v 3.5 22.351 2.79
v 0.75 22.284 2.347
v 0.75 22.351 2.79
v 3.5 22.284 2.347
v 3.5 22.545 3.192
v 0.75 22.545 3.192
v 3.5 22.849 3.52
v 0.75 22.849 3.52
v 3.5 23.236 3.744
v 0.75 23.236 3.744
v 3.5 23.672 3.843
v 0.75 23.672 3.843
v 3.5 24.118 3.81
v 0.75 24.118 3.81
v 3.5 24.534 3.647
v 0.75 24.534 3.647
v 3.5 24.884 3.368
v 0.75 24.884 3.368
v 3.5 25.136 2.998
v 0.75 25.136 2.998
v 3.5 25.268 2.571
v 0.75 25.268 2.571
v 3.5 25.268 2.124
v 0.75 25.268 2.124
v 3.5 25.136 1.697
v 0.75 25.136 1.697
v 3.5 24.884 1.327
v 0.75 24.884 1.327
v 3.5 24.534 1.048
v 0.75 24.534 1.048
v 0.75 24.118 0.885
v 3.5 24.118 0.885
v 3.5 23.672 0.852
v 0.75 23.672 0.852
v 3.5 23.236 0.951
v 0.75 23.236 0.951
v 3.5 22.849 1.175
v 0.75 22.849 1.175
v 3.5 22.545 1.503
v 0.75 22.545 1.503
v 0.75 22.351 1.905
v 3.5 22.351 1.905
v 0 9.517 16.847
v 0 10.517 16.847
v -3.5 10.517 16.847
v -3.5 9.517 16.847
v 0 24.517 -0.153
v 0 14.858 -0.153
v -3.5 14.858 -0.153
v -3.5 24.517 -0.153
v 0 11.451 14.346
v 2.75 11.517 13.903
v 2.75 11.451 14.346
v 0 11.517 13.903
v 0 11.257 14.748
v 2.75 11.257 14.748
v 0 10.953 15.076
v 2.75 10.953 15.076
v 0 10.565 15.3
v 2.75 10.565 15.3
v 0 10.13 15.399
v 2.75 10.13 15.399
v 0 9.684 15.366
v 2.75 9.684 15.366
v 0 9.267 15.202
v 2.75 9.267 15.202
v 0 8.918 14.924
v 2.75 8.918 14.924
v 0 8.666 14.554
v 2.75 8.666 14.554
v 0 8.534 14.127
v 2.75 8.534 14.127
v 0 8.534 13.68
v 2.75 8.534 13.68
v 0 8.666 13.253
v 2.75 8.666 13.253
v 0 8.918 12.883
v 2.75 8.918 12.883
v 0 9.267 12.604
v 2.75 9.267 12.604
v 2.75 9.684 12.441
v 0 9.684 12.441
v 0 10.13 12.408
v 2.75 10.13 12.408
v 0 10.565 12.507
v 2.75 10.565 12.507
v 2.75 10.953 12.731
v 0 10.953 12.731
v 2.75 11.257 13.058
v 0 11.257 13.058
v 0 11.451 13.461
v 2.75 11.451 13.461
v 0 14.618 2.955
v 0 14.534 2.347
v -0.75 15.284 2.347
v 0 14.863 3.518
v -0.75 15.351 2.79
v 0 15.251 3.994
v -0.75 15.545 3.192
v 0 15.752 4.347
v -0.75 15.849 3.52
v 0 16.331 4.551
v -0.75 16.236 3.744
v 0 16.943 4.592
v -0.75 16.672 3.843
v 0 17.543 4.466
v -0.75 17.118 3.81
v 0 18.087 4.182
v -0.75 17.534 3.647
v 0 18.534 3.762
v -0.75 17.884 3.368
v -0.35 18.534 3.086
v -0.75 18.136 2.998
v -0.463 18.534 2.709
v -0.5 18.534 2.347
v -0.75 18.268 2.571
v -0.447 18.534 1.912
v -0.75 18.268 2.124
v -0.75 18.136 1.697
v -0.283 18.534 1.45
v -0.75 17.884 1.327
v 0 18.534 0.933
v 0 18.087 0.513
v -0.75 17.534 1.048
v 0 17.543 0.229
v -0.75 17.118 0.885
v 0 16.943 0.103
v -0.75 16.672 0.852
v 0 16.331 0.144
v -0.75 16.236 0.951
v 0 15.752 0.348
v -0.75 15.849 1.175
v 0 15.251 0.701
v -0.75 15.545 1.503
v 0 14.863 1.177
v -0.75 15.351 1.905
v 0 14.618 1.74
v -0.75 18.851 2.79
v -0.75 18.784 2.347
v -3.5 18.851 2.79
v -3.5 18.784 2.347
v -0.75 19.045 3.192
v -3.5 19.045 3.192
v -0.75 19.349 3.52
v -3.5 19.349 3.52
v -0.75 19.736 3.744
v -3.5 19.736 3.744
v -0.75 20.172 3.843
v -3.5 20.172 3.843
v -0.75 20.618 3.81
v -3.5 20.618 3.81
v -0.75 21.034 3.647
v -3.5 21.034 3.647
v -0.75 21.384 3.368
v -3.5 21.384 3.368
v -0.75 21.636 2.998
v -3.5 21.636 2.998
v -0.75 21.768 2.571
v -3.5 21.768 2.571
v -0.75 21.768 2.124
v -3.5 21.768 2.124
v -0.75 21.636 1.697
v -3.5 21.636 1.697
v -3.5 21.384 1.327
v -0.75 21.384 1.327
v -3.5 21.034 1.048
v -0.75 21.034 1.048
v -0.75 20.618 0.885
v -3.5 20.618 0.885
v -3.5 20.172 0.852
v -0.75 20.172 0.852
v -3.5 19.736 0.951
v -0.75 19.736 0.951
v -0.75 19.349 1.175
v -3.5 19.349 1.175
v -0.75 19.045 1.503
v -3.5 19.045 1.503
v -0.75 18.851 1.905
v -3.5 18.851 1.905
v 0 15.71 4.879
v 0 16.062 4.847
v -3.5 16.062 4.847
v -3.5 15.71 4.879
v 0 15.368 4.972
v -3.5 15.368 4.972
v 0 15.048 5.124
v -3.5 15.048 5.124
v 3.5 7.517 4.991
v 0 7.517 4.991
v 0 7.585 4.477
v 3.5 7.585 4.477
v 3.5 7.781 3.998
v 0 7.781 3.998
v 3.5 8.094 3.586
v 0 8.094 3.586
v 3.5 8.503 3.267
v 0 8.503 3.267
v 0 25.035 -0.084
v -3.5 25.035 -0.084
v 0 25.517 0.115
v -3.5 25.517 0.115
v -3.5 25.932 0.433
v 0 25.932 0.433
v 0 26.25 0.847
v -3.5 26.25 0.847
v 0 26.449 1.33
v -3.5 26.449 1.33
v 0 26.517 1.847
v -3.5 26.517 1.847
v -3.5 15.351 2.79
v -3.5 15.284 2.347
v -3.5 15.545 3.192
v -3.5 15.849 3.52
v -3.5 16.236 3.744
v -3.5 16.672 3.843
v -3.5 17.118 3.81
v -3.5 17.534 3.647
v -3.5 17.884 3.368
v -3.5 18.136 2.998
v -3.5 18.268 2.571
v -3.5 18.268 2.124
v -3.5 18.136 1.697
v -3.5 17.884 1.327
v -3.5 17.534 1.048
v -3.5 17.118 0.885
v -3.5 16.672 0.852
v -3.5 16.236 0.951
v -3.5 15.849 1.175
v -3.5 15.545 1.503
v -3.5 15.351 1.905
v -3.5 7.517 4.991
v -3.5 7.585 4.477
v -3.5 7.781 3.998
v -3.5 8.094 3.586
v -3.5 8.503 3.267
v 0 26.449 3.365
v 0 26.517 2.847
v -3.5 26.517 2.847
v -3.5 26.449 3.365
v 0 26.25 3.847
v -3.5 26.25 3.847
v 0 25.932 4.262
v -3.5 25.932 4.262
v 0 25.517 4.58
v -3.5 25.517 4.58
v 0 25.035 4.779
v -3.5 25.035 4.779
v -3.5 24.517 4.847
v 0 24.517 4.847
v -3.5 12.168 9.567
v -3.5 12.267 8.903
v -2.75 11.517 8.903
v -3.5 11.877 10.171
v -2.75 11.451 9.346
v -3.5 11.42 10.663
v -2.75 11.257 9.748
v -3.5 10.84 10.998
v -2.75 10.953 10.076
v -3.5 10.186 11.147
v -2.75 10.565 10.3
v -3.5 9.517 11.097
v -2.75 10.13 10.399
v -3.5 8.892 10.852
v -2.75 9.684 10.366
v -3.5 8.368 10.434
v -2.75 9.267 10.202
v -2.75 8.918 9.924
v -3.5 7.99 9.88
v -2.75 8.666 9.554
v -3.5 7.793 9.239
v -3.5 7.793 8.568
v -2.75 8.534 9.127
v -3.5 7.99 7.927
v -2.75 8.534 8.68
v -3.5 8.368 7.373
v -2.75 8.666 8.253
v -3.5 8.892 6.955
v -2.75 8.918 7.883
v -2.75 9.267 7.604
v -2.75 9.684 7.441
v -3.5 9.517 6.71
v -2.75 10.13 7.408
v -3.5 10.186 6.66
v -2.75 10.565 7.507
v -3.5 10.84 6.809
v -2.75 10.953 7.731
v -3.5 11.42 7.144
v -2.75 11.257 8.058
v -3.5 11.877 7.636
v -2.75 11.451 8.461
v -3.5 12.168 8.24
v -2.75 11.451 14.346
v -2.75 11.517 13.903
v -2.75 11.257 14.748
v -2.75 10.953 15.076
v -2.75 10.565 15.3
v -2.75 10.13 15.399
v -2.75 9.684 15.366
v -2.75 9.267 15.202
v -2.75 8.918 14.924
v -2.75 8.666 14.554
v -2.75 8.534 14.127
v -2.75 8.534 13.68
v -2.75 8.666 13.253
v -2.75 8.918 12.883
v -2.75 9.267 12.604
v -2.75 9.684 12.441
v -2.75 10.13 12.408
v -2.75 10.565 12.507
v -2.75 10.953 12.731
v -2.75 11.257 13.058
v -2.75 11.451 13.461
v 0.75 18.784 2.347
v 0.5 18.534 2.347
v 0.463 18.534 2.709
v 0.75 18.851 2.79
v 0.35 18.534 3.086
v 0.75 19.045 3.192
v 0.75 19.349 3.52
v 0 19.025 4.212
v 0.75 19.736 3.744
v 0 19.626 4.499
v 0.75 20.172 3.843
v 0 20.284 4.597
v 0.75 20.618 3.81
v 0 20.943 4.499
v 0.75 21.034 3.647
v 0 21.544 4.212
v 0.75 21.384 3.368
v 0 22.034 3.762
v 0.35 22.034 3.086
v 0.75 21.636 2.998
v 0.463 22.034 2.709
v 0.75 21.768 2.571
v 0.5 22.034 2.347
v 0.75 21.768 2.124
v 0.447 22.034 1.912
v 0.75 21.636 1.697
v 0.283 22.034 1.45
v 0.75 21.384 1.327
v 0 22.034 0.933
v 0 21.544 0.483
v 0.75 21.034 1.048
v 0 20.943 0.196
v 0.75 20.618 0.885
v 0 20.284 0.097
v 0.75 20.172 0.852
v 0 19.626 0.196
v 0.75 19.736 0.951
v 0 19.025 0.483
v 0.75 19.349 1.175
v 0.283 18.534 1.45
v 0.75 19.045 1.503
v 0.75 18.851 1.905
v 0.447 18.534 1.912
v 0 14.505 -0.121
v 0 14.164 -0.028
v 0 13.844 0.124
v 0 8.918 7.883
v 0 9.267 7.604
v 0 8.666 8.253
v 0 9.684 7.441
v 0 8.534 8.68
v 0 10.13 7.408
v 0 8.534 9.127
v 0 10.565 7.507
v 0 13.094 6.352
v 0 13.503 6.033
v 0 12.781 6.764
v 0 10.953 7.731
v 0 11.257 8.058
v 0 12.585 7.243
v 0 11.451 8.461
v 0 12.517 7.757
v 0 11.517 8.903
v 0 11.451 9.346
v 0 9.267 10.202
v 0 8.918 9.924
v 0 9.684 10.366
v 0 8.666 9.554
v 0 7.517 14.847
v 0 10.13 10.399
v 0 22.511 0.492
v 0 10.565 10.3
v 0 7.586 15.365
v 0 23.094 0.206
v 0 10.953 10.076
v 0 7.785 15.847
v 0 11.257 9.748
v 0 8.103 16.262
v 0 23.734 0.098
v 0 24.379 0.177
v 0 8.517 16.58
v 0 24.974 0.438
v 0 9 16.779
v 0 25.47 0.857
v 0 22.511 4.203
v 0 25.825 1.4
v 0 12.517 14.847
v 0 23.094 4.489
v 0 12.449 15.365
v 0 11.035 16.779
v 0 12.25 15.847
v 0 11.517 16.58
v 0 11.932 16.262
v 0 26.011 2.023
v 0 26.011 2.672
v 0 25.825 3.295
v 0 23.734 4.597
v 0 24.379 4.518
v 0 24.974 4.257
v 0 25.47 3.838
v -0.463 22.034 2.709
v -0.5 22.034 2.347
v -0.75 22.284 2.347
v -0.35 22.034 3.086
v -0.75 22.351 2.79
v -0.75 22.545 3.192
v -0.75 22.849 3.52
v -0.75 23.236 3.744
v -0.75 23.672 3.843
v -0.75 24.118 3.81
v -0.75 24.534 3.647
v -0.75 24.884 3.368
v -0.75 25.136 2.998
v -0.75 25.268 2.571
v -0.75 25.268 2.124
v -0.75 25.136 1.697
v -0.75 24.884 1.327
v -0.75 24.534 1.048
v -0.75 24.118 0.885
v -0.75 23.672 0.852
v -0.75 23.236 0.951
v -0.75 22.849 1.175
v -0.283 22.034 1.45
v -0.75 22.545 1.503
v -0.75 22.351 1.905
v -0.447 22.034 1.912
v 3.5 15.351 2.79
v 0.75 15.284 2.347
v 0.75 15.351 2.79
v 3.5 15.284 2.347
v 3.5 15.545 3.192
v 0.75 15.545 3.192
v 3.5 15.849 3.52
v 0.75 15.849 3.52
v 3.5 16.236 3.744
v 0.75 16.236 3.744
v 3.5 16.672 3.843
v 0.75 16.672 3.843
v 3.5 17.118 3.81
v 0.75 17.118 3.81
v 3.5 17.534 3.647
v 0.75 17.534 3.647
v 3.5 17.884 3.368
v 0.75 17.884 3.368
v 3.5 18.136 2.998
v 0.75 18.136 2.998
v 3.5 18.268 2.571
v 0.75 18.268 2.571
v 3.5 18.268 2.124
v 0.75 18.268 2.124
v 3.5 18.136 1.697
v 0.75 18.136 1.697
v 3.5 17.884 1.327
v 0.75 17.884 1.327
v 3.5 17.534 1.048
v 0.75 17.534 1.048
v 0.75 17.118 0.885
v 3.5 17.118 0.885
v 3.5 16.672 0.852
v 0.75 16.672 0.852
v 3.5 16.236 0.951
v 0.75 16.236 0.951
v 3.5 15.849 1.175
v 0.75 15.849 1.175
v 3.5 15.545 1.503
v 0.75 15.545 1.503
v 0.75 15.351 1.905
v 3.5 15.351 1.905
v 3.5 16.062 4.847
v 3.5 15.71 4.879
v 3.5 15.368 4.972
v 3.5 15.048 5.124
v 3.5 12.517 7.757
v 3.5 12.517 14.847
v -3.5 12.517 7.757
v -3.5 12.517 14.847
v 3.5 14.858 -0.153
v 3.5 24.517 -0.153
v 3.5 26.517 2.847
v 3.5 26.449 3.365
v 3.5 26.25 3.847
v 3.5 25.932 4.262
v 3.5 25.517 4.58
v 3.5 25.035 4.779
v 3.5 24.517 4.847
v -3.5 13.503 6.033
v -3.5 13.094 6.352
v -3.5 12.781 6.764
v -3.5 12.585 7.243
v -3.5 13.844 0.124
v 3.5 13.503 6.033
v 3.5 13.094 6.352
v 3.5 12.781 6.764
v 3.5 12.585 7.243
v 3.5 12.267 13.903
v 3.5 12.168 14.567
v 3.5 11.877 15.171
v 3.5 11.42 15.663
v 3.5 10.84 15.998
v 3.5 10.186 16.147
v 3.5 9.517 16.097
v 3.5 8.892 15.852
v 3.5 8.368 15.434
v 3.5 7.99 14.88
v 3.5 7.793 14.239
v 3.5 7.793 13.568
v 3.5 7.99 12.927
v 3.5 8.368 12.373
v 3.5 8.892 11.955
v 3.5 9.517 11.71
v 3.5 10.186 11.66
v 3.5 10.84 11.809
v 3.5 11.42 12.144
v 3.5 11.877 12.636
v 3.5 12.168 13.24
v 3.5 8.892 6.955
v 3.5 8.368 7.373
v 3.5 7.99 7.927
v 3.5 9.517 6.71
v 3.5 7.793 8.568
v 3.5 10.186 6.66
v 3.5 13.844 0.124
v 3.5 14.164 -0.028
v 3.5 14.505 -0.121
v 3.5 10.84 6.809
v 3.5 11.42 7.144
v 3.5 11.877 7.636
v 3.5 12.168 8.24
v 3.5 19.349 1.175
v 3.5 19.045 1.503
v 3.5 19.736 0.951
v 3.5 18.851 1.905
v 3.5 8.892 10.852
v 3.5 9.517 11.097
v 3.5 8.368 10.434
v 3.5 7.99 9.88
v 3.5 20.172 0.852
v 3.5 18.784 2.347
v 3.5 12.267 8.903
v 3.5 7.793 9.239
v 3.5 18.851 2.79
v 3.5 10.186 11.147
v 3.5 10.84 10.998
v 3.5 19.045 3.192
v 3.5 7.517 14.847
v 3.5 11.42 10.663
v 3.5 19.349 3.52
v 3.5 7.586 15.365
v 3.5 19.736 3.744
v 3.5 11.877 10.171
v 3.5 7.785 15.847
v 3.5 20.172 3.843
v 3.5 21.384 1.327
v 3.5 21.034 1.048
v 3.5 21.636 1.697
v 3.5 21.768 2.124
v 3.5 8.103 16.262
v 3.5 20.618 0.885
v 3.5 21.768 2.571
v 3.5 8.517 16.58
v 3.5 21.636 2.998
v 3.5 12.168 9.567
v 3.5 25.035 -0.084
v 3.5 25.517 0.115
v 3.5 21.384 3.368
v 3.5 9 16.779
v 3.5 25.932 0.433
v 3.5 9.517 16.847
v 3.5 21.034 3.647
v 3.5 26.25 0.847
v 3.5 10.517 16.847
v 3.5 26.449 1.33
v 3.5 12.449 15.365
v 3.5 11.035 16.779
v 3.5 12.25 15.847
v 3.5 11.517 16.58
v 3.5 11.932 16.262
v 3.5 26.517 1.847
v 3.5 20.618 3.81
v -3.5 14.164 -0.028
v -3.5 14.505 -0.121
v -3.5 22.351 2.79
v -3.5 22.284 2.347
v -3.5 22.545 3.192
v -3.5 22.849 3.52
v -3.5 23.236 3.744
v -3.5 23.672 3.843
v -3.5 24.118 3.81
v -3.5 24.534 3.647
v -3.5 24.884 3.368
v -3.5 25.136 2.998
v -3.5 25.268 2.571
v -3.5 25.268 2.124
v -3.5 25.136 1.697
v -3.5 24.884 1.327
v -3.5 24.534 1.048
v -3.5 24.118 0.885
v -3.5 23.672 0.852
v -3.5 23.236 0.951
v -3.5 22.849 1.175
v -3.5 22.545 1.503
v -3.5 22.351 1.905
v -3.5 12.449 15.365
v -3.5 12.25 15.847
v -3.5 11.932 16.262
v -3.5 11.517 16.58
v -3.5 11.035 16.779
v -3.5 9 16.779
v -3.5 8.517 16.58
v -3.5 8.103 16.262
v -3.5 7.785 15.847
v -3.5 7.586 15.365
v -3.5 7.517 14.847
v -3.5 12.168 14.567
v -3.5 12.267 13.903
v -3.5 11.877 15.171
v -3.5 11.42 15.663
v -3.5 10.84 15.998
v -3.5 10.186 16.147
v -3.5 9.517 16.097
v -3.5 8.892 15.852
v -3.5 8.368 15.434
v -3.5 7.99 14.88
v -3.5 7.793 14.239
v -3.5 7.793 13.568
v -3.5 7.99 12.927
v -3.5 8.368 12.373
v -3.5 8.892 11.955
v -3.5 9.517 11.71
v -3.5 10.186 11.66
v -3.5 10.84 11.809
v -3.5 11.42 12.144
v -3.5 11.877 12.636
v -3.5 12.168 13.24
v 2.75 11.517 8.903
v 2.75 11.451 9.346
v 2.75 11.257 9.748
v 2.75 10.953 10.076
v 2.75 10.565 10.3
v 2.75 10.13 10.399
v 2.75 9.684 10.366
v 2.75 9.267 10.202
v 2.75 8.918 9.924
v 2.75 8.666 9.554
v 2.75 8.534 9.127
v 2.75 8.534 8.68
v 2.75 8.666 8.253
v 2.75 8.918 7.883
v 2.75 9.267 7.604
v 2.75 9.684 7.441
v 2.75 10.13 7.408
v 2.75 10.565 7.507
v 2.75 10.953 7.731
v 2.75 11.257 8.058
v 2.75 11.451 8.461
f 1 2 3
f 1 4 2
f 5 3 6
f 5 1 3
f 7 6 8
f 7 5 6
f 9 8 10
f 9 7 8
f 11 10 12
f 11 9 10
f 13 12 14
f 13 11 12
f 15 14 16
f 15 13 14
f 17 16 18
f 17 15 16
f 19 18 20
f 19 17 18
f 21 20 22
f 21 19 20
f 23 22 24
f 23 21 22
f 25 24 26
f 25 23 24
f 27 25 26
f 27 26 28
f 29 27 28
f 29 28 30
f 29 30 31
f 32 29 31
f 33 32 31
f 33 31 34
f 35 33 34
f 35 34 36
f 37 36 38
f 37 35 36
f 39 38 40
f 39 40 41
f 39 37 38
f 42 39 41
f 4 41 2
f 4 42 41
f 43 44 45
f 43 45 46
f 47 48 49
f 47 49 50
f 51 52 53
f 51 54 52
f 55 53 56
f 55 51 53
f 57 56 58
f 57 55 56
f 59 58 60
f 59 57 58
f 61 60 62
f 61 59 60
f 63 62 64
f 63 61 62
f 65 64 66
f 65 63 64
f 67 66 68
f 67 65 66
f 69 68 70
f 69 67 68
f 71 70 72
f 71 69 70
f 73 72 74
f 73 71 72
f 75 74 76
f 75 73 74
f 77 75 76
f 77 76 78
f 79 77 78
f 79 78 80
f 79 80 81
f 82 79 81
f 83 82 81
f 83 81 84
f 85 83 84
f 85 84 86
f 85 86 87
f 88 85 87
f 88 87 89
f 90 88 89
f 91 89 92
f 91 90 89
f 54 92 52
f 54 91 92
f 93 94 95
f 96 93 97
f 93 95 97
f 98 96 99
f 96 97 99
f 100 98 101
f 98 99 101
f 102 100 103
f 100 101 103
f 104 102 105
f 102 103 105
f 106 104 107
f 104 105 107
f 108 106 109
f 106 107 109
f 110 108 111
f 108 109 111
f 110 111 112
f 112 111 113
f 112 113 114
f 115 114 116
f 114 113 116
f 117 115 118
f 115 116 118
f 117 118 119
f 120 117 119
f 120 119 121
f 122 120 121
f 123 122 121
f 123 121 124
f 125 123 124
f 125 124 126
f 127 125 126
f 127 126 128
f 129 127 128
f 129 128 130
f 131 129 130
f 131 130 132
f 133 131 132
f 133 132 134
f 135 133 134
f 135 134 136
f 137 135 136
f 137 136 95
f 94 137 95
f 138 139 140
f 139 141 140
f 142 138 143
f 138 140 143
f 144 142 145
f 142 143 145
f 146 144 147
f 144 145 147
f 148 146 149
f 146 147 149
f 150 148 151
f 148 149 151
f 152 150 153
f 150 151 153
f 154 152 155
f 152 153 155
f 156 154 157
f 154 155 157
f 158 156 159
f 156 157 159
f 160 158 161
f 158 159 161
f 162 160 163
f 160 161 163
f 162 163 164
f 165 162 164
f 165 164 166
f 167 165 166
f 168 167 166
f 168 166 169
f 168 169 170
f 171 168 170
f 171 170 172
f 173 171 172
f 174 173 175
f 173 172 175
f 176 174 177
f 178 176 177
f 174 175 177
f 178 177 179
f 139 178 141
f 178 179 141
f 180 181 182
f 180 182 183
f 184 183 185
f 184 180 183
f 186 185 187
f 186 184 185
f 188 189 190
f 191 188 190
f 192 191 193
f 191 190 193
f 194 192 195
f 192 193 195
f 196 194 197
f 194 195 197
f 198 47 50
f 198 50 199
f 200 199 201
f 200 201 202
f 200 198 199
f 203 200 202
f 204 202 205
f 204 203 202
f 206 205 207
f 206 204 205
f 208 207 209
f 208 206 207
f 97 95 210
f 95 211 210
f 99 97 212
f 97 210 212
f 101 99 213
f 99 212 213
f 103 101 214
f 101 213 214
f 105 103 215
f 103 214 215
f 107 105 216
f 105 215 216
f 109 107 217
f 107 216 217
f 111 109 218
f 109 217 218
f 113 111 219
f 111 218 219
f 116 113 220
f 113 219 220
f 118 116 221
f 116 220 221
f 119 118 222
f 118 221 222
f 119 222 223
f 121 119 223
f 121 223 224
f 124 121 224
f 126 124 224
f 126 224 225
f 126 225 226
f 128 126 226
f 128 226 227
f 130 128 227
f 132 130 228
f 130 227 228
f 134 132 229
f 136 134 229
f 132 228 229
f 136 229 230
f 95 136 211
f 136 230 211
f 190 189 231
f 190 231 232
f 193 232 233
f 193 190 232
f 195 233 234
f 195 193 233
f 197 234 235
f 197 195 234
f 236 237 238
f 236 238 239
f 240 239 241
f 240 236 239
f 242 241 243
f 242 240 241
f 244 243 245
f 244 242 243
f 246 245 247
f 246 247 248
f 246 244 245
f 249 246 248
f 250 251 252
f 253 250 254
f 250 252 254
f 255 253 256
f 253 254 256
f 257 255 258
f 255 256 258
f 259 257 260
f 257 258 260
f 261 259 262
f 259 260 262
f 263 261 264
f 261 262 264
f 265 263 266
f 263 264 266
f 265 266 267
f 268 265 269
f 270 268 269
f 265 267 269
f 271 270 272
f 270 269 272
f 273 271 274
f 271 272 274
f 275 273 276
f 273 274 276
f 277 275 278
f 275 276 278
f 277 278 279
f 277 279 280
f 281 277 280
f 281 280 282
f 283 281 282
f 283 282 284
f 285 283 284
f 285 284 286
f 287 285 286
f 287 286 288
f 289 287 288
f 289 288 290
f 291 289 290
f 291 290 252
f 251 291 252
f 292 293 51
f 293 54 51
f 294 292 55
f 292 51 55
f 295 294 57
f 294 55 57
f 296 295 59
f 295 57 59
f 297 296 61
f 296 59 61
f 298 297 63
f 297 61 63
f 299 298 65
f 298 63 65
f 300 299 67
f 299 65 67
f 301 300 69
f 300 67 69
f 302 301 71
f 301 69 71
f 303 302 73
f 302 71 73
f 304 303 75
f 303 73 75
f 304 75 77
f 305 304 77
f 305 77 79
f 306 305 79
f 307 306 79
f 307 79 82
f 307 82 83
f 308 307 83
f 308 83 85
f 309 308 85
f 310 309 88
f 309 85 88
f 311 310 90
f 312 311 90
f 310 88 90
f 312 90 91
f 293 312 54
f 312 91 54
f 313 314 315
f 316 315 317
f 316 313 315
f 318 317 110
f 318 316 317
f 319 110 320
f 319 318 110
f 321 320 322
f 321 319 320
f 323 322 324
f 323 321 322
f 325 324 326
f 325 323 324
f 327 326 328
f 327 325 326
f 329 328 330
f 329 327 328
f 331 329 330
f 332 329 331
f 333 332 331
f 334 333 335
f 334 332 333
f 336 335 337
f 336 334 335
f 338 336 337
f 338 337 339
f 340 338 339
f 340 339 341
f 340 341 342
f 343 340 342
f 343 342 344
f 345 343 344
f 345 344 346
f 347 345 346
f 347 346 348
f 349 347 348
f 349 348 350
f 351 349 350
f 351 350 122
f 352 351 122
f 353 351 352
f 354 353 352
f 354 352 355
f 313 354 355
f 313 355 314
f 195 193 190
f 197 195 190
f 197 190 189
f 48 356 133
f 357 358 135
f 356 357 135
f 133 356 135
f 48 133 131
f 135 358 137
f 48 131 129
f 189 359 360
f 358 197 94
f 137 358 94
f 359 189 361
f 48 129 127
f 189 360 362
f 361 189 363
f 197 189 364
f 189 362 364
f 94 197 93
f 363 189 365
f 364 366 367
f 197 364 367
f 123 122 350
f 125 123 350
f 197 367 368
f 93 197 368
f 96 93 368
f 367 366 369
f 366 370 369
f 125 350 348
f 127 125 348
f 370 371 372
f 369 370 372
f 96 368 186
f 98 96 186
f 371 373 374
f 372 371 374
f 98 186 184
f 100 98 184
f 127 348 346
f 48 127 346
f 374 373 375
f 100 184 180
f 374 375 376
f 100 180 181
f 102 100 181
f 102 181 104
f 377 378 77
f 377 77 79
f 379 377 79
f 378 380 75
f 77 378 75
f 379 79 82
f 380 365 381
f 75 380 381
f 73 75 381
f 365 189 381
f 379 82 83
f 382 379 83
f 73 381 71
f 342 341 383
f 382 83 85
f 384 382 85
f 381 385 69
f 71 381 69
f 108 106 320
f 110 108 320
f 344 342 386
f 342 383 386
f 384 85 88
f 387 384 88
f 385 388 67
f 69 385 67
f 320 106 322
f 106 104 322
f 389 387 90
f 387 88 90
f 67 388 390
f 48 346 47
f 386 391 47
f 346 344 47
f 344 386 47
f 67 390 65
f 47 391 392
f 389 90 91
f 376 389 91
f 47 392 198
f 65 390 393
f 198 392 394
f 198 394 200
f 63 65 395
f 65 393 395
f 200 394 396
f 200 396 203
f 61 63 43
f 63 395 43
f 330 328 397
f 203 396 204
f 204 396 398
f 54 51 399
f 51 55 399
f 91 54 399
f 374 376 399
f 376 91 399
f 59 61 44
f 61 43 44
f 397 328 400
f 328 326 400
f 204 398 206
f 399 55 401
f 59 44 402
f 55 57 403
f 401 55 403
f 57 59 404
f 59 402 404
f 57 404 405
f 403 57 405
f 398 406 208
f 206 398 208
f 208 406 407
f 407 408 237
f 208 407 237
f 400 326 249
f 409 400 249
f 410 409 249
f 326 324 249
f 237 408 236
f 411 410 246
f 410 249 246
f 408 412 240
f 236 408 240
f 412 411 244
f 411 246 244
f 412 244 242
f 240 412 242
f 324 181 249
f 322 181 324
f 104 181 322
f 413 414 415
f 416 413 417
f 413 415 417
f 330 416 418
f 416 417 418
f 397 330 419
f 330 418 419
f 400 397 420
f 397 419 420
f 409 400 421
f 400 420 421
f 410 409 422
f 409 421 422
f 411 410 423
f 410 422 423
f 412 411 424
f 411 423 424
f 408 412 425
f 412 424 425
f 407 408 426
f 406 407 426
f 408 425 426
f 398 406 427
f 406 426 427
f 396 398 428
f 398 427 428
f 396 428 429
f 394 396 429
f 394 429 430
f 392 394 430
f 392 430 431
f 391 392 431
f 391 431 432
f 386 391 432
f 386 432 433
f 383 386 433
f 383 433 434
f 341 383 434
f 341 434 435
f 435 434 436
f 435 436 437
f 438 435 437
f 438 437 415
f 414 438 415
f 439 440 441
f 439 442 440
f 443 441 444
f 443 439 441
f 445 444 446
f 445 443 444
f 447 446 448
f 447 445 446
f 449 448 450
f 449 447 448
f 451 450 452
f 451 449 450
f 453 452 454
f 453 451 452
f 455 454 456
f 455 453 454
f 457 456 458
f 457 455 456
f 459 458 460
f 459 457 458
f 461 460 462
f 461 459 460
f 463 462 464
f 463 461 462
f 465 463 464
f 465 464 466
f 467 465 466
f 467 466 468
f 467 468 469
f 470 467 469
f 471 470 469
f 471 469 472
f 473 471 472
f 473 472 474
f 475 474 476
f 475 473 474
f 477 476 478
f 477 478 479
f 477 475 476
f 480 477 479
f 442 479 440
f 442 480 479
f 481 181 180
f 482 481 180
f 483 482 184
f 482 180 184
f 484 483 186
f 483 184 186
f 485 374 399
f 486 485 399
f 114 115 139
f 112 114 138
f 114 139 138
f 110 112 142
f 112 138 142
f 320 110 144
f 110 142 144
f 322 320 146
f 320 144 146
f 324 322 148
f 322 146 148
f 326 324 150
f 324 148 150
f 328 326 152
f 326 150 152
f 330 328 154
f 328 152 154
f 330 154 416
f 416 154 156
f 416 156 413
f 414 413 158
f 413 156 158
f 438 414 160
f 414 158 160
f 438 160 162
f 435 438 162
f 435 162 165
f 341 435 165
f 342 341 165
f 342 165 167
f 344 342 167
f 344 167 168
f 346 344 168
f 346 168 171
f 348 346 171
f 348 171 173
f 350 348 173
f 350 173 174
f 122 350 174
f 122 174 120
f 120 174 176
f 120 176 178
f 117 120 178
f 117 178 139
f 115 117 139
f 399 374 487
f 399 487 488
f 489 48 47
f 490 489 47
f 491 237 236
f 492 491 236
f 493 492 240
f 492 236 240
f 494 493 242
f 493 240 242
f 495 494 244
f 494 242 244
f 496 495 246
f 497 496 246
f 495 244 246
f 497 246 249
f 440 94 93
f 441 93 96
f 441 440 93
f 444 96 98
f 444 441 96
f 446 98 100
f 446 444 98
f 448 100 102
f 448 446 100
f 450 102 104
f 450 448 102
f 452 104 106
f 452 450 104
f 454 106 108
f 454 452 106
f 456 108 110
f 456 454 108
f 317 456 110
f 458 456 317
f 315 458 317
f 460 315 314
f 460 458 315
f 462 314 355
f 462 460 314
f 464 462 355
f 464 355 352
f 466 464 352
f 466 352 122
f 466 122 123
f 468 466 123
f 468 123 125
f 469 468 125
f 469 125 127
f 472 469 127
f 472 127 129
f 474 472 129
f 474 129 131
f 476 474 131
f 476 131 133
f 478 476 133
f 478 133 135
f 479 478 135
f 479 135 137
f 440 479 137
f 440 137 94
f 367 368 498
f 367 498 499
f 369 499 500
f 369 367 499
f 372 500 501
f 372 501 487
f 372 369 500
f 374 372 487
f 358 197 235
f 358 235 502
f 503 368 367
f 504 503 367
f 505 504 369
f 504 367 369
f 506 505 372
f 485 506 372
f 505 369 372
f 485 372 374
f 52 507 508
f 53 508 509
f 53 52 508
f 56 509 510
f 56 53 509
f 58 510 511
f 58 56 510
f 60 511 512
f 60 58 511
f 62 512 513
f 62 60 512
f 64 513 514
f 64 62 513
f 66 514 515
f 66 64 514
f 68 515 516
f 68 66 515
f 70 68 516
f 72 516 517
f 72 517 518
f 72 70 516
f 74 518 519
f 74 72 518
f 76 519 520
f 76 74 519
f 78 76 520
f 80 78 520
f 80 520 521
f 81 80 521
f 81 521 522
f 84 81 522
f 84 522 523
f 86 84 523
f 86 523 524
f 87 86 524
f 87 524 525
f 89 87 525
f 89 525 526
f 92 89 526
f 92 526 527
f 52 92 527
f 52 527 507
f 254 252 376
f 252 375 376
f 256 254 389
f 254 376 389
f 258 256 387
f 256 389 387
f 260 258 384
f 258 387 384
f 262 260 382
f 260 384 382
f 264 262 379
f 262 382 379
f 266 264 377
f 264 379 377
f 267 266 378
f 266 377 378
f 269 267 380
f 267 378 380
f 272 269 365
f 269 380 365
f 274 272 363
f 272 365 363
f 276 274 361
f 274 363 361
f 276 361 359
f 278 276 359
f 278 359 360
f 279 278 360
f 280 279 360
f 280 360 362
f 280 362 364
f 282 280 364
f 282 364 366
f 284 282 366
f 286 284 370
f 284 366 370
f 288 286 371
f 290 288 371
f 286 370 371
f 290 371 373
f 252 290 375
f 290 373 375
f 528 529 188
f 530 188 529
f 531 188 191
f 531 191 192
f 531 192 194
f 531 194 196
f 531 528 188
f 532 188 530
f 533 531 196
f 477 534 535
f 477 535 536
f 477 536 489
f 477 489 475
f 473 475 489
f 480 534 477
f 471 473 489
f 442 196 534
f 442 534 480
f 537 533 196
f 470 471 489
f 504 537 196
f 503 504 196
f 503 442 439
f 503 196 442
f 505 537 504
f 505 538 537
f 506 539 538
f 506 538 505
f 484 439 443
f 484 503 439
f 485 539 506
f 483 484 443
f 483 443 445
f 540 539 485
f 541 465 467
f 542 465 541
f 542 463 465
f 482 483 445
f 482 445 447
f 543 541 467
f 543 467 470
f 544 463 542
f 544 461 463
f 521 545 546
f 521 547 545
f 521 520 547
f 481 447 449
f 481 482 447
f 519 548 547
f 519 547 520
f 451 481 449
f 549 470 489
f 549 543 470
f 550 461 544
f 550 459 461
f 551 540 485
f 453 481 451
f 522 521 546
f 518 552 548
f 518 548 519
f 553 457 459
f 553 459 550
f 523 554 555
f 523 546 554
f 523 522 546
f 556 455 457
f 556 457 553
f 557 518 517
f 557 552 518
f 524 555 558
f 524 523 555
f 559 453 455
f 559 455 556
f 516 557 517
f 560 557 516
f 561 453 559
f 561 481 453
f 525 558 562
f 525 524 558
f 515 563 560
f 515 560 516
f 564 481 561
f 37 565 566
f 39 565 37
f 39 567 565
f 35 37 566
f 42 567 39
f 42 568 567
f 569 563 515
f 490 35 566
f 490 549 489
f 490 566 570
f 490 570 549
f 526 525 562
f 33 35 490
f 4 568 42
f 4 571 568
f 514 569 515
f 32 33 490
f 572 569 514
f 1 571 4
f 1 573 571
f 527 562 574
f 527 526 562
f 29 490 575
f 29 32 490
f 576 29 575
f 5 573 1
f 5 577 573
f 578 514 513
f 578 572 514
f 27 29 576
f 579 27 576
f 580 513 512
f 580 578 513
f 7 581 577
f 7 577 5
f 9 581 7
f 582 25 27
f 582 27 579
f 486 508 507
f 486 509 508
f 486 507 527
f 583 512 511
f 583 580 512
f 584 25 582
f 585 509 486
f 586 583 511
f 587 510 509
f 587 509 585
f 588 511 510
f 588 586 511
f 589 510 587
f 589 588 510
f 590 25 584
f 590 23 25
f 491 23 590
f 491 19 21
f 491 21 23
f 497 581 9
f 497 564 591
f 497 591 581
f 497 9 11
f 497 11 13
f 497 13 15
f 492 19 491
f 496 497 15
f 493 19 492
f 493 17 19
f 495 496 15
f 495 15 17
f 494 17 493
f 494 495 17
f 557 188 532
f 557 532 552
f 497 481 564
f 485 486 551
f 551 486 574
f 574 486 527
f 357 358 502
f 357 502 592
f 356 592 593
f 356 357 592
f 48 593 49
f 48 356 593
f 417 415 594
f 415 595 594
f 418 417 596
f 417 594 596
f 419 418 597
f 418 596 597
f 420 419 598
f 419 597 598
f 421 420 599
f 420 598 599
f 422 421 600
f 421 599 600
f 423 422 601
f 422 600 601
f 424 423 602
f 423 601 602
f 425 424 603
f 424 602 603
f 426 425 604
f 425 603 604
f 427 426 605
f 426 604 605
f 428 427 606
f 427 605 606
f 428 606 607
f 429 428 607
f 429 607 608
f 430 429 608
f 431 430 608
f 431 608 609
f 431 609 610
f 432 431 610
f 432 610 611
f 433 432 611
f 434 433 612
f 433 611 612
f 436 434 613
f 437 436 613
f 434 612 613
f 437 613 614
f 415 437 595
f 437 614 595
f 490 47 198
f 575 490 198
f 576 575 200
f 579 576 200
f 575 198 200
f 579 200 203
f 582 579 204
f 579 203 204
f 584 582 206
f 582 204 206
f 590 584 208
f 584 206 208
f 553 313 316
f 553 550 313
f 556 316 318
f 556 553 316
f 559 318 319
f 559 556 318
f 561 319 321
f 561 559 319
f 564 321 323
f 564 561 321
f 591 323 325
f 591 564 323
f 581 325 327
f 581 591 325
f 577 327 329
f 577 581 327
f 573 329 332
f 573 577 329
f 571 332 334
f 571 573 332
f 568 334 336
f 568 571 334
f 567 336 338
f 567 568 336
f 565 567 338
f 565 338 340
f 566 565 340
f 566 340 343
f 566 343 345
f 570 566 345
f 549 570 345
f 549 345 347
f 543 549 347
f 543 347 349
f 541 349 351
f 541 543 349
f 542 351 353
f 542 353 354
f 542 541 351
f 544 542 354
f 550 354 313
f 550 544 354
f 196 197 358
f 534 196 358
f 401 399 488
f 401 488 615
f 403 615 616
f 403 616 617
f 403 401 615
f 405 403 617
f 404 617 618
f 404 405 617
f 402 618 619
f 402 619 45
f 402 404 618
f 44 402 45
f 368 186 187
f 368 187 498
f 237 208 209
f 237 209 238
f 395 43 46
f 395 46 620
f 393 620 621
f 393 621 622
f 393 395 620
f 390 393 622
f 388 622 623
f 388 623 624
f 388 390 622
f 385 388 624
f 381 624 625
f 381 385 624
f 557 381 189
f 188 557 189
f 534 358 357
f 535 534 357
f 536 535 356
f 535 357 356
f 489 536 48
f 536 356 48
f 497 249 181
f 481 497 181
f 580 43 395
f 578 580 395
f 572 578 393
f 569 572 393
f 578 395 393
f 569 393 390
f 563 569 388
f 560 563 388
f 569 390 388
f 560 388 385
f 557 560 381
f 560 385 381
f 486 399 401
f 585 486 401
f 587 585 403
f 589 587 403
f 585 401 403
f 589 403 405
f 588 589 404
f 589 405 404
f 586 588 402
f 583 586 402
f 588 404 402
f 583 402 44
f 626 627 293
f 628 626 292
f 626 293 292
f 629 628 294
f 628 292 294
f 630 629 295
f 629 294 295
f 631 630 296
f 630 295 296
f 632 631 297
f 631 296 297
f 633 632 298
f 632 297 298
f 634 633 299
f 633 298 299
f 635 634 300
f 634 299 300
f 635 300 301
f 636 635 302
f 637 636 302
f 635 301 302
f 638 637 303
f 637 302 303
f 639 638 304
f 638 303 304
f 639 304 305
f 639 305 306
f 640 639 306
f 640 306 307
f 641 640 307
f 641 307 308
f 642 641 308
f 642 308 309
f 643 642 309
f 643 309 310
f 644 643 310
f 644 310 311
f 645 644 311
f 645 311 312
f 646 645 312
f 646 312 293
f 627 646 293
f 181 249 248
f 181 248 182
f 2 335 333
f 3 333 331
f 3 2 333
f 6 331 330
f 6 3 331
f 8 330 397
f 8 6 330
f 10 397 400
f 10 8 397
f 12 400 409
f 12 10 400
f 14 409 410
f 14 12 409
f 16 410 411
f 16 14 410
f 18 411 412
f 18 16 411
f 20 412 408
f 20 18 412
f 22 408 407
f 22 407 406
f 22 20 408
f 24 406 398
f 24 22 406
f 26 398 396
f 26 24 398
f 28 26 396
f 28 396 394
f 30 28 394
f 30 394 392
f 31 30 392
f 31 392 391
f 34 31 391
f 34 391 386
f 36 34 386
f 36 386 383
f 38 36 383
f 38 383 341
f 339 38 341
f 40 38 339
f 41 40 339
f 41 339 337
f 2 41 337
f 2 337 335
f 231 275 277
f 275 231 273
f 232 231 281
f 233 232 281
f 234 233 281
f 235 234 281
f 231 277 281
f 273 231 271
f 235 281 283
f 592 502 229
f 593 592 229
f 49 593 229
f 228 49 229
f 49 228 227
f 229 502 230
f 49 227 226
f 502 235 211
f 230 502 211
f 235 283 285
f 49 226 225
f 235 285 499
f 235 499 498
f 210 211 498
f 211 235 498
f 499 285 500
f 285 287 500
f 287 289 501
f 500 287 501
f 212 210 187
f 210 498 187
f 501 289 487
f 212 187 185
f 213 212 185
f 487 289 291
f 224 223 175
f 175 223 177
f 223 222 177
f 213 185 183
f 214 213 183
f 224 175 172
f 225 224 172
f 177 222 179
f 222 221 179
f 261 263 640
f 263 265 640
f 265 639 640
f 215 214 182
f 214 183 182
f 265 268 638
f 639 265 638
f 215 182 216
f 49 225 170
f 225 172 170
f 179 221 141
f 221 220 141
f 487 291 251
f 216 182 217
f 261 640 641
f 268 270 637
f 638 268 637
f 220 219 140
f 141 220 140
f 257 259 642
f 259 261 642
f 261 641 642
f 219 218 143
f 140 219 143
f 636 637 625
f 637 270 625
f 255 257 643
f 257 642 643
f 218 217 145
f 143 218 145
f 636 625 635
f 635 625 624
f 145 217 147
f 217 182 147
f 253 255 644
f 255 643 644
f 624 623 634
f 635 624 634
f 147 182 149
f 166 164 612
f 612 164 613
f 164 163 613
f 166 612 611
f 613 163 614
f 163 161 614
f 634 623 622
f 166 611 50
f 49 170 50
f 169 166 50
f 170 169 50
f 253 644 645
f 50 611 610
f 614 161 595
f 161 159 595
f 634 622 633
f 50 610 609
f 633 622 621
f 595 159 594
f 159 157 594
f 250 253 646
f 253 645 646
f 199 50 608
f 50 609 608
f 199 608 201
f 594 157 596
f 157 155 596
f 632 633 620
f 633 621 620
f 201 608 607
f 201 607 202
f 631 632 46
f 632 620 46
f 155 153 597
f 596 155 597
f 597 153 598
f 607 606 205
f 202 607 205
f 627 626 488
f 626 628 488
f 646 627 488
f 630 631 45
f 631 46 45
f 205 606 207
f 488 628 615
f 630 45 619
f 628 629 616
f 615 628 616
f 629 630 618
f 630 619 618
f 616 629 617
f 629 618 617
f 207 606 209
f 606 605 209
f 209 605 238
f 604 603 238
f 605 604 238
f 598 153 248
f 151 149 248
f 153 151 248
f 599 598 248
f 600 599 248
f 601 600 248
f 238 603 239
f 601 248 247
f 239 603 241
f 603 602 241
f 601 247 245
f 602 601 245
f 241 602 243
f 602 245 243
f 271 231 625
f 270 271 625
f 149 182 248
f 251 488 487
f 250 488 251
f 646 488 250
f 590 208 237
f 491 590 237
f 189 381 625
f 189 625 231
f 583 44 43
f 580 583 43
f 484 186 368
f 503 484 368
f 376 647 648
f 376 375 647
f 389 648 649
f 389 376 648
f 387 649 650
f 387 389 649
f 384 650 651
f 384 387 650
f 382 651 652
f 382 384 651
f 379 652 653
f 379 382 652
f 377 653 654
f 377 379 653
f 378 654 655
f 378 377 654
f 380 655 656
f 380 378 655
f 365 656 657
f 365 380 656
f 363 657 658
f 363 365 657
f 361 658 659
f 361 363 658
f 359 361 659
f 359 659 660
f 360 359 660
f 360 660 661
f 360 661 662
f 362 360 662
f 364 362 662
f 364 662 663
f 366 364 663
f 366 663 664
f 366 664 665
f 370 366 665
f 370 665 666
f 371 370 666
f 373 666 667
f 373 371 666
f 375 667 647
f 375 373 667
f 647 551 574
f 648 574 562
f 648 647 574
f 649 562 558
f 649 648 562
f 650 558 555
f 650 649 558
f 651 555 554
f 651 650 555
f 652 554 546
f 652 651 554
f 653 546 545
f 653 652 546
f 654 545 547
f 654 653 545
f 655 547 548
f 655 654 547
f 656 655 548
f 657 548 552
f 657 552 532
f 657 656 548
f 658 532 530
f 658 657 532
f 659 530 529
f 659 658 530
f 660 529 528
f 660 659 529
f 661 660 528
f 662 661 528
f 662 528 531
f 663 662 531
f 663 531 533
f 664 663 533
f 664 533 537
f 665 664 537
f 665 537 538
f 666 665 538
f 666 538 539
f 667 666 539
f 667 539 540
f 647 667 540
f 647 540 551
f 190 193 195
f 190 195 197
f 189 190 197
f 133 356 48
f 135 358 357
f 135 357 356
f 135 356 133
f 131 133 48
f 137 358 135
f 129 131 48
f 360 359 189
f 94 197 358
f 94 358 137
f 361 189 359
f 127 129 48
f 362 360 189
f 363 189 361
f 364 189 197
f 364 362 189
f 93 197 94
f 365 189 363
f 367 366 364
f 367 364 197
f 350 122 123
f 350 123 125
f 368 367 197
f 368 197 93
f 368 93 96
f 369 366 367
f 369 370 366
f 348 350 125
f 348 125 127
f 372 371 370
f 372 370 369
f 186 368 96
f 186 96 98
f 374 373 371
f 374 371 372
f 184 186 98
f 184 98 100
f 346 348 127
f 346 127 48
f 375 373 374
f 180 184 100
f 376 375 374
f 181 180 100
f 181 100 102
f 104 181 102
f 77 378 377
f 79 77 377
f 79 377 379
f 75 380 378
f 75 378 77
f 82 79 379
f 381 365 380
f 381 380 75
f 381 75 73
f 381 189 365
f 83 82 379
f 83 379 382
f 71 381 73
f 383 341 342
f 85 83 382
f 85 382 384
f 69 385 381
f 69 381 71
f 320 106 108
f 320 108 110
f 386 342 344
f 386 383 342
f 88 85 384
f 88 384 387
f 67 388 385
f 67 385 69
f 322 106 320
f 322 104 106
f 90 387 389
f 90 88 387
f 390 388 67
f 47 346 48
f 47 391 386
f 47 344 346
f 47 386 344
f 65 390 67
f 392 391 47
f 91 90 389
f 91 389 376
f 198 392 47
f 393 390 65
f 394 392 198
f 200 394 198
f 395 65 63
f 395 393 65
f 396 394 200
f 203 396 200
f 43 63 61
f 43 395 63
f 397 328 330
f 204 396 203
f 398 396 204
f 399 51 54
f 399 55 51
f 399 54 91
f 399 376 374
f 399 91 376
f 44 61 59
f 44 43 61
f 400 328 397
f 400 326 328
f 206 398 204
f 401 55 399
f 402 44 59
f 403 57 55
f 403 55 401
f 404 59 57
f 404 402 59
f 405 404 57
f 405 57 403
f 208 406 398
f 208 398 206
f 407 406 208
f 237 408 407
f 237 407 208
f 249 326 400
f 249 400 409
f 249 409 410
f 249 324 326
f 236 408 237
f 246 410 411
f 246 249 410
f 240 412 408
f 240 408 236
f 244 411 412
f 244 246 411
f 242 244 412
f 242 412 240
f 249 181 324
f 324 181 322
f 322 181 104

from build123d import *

# Parameters (mm, degrees)
F1_DEPTH       = 3.5
F2_D           = 3
F2_CSINK_D     = 4.5
F2_CSINK_ANGLE = 90
F4_D           = 3
F4_CSINK_D     = 4.5
F4_CSINK_ANGLE = 90


with BuildPart() as f1:
    # F0 (on Right) → F1 (new body)
    with BuildSketch(Plane.YZ):
        with BuildLine():
            Line((7.517485, 14.847486), (7.517485, 4.991017))
            ThreePointArc((7.517485, 4.991017), (7.781251, 3.998298), (8.502976, 3.267424))
            Line((8.502976, 3.267424), (13.843657, 0.123893))
            ThreePointArc((13.843657, 0.123893), (14.332421, -0.082176), (14.858165, -0.152514))
            Line((14.858165, -0.152514), (24.517485, -0.152514))
            ThreePointArc((24.517485, -0.152514), (25.931699, 0.433272), (26.517485, 1.847486))
            Line((26.517485, 1.847486), (26.517485, 2.347486))
            Line((26.517485, 2.347486), (26.517485, 2.847486))
            ThreePointArc((26.517485, 2.847486), (25.931699, 4.261699), (24.517485, 4.847486))
            Line((24.517485, 4.847486), (16.062394, 4.847486))
            ThreePointArc((16.062394, 4.847486), (15.536649, 4.917824), (15.047885, 5.123893))
            Line((15.047885, 5.123893), (13.502976, 6.033228))
            ThreePointArc((13.502976, 6.033228), (12.781251, 6.764102), (12.517485, 7.756821))
            Line((12.517485, 7.756821), (12.517485, 14.847486))
            ThreePointArc((12.517485, 14.847486), (11.931699, 16.261699), (10.517485, 16.847486))
            Line((10.517485, 16.847486), (10.017485, 16.847486))
            Line((10.017485, 16.847486), (9.517485, 16.847486))
            ThreePointArc((9.517485, 16.847486), (8.103272, 16.261699), (7.517485, 14.847486))
        make_face()
    extrude(amount=-F1_DEPTH)

    # F2 (through all)
    with Locations(Plane.YZ):
        with Locations((23.784457, 2.347486), (20.284457, 2.347486), (16.784457, 2.347486)):
            CounterSinkHole(F2_D / 2, F2_CSINK_D / 2, counter_sink_angle=F2_CSINK_ANGLE)

    # F4 (through all)
    with Locations(Plane(origin=(-3.5, 0, 0), x_dir=(0, -1, 0), z_dir=(-1, 0, 0))):
        with Locations((-10.017485, 13.90345), (-10.017485, 8.90345)):
            CounterSinkHole(F4_D / 2, F4_CSINK_D / 2, counter_sink_angle=F4_CSINK_ANGLE)


with BuildPart() as f5_1:
    # F5: instance of F1
    add(f1.part.mirror(Plane.YZ))


solid = Compound([f1.part, f5_1.part])
